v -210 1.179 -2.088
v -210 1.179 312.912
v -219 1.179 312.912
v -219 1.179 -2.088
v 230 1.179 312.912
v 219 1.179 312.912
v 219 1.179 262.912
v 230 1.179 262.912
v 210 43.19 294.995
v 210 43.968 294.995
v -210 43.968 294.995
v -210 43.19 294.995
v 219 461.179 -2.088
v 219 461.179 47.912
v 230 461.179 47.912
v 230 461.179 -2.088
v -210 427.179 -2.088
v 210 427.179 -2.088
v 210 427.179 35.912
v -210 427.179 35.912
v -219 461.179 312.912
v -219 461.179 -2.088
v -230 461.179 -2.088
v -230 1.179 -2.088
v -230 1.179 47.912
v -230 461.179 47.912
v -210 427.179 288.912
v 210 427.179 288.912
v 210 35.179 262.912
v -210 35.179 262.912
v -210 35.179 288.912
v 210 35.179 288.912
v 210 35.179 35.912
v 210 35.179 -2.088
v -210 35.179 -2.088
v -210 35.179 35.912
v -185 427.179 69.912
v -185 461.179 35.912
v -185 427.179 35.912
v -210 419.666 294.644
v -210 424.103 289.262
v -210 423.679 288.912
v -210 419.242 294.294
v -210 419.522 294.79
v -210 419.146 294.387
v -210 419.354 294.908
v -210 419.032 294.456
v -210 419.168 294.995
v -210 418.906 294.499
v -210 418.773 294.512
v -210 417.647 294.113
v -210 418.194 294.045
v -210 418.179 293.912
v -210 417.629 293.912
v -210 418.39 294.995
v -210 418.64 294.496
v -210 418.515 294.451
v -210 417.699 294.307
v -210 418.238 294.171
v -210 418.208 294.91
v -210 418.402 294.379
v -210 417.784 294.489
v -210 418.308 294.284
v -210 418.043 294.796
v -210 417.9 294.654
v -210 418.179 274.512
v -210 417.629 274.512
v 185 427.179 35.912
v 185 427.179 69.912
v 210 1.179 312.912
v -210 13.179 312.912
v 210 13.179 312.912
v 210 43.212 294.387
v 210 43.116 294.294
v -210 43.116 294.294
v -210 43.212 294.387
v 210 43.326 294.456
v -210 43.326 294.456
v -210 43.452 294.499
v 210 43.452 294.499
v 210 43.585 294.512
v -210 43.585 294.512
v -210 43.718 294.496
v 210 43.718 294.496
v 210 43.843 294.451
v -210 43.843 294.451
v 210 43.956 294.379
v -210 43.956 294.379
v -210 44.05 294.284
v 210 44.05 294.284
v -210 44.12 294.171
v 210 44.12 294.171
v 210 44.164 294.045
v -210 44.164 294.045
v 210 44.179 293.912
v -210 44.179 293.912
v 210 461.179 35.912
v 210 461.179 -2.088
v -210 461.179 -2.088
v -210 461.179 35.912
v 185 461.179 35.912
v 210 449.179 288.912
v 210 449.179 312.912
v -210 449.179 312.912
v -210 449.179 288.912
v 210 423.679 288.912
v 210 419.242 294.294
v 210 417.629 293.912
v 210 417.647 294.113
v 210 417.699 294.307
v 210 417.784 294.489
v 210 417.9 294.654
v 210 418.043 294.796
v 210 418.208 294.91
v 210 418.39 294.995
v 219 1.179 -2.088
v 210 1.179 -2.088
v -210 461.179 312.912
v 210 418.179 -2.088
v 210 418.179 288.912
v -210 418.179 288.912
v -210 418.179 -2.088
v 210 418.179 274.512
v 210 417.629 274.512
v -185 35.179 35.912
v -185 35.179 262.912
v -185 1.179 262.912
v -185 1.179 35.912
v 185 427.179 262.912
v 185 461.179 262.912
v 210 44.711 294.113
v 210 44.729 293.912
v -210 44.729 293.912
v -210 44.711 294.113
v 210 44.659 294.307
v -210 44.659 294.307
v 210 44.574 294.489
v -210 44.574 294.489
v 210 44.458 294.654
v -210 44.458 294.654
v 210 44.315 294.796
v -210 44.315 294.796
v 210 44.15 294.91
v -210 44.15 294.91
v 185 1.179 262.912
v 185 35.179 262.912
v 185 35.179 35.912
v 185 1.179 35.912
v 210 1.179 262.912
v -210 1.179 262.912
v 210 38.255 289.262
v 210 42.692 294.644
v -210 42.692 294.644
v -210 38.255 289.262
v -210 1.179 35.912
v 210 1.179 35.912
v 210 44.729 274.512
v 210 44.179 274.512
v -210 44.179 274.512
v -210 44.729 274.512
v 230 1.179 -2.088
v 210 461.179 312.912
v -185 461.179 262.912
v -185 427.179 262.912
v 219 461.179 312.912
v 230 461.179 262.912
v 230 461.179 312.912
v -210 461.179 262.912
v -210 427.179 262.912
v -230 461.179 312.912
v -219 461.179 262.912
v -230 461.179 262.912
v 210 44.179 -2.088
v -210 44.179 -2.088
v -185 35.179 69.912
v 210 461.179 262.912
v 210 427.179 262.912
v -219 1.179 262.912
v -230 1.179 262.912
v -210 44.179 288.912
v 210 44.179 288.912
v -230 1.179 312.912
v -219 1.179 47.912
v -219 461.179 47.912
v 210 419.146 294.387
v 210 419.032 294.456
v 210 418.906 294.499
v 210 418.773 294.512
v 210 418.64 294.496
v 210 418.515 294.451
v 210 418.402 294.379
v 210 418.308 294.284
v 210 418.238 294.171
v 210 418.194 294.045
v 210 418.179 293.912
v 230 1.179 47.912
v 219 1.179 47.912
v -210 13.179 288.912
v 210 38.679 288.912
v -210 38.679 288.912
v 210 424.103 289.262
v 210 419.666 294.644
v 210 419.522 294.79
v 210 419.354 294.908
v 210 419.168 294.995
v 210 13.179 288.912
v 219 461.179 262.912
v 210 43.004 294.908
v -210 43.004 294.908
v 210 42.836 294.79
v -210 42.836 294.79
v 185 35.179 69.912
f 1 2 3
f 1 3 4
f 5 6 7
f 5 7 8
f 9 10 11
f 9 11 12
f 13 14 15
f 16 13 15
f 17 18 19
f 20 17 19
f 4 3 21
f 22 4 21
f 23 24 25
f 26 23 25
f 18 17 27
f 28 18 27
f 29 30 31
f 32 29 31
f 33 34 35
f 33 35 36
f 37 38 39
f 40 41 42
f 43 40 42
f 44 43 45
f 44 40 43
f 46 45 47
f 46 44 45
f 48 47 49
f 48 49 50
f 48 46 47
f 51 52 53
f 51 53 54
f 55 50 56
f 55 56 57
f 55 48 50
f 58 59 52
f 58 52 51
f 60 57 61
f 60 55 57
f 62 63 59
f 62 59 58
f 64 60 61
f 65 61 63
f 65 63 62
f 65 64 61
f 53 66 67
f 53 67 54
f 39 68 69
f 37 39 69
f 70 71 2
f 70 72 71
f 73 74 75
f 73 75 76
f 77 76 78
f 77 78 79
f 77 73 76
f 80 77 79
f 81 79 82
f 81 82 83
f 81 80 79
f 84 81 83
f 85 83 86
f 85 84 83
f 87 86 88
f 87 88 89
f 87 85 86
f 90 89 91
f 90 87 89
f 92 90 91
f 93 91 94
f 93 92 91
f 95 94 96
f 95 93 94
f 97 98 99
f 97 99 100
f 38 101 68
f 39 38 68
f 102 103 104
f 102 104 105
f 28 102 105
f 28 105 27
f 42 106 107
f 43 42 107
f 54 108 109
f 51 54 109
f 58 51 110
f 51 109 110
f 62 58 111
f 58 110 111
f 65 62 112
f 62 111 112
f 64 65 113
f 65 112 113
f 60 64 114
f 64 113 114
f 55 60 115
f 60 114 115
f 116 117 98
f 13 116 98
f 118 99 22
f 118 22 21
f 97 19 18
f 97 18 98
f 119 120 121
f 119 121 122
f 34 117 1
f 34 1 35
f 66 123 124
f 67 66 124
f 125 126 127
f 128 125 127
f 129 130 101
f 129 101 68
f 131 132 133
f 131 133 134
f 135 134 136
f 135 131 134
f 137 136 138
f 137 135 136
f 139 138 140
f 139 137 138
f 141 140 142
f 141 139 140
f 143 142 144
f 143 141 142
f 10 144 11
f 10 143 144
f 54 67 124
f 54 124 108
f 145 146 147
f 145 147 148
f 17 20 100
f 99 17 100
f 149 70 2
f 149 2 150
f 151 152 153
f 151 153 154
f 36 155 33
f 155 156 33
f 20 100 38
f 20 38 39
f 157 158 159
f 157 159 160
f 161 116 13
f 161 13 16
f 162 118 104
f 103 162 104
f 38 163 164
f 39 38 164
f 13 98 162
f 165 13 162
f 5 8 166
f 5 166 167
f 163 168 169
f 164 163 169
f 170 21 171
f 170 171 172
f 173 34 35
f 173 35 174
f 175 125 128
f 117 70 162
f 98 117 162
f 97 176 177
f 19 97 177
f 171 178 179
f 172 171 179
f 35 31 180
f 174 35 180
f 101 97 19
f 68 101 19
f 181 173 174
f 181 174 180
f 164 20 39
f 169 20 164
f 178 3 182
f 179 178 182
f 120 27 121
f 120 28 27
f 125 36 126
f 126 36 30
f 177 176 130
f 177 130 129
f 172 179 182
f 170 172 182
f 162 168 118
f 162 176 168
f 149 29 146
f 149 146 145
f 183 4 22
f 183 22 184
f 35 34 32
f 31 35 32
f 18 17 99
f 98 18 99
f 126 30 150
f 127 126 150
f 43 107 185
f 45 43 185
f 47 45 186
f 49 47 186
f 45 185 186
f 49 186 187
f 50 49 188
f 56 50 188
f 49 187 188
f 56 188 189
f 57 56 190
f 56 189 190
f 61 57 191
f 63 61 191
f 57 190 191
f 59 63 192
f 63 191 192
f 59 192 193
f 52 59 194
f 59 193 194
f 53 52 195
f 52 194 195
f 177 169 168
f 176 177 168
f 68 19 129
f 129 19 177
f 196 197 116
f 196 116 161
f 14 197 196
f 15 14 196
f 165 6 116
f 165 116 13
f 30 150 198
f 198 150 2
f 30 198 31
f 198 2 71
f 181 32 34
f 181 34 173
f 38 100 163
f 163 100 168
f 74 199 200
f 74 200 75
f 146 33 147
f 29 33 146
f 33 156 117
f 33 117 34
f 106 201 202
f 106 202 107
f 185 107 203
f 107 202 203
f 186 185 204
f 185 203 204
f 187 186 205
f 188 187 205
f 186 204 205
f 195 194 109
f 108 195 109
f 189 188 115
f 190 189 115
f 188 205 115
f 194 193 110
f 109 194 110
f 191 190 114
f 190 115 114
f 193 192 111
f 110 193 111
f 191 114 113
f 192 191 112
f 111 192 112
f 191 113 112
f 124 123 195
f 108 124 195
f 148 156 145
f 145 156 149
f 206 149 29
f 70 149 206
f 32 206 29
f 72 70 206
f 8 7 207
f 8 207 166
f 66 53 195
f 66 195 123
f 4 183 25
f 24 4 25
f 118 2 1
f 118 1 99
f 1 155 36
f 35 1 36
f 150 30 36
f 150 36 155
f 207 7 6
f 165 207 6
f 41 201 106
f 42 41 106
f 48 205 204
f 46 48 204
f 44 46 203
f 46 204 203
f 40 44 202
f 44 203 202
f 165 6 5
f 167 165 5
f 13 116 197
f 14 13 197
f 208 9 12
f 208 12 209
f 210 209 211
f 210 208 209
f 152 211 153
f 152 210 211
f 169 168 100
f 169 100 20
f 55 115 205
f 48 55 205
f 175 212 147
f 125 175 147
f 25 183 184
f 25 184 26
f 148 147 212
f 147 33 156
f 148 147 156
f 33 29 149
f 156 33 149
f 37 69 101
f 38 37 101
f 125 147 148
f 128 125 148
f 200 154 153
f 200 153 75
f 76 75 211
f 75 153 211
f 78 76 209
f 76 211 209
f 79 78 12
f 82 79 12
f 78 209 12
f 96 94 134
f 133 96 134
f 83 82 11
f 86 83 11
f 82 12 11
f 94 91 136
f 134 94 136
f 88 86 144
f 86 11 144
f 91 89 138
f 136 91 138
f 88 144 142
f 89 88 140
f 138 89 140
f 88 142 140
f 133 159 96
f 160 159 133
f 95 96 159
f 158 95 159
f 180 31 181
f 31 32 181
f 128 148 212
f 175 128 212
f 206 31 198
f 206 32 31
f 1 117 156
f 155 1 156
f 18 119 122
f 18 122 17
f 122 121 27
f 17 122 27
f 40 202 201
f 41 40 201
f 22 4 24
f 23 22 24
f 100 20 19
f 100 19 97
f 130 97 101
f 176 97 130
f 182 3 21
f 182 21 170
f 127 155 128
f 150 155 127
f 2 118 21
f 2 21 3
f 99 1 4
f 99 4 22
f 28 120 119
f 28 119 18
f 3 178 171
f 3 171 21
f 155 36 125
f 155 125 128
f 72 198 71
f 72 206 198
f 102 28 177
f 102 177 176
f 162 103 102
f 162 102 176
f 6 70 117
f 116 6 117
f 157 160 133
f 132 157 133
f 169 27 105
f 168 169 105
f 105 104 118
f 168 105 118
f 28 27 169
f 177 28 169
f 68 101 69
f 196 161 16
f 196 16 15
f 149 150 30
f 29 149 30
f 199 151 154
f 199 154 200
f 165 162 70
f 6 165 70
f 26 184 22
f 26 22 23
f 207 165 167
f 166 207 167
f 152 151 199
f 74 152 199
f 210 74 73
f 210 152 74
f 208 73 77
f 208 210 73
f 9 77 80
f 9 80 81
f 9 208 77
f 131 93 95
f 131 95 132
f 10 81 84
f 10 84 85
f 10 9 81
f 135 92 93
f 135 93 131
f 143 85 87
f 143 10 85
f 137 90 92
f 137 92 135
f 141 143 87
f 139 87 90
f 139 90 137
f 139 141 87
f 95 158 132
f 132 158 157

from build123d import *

# Parameters (mm, degrees)
F0_W      = 9
F0_H      = 291
F1_DEPTH  = 210
F2_W      = 34
F2_H      = 38
F3_DEPTH  = 210
F5_DEPTH  = 420
F9_DEPTH  = 9
F10_W     = 11
F10_H     = 50
F11_DEPTH = 460
F12_W     = 34
F12_H     = 227
F13_DEPTH = 25
F16_DEPTH = 370


# Not quite as in the source:
# - ends of sketch curves that miss each other by under 0.0002 mm in the source are joined


with BuildPart() as f1:
    # F0 (on Right) → F1 (new body, symmetric)
    with BuildSketch(Plane.YZ):
        with Locations((39.679, 143.4123)):
            Rectangle(F0_W, F0_H)
    extrude(amount=F1_DEPTH, both=True)


with BuildPart() as f1b:
    # F0 (on Right) → F1, piece 2 (new body, symmetric)
    with BuildSketch(Plane.YZ):
        Polygon((427.179, 288.9123), (418.179, 288.9123), (418.179, -2.0877000002), (427.1789405548, -2.0877634065), align=None)
    extrude(amount=F1_DEPTH, both=True)


with BuildPart() as f3:
    # F2 (on Right) → F3 (new body, symmetric)
    with BuildSketch(Plane.YZ):
        with Locations((18.179, 16.9123)):
            Rectangle(F2_W, F2_H)
    extrude(amount=F3_DEPTH, both=True)


with BuildPart() as f3b:
    # F2 (on Right) → F3, piece 2 (new body, symmetric)
    with BuildSketch(Plane.YZ):
        Polygon((13.179, 312.9123), (1.179, 312.9123), (1.179, 262.9123), (35.179, 262.9123), (35.179, 288.9123), (13.179, 288.9123), align=None)
    extrude(amount=F3_DEPTH, both=True)


with BuildPart() as f3c:
    # F2 (on Right) → F3, piece 3 (new body, symmetric)
    with BuildSketch(Plane.YZ):
        Polygon((461.179, 262.9123), (461.179, 312.9123), (449.179, 312.9123), (449.179, 288.9123), (427.179, 288.9123), (427.179, 262.9123), align=None)
    extrude(amount=F3_DEPTH, both=True)


with BuildPart() as f3d:
    # F2 (on Right) → F3, piece 4 (new body, symmetric)
    with BuildSketch(Plane.YZ):
        with Locations((444.179, 16.9123)):
            Rectangle(F2_W, F2_H)
    extrude(amount=F3_DEPTH, both=True)


with BuildPart() as f5:
    # F4 (on face) → F5 (new body, through all)
    with BuildSketch(Plane.YZ.offset(210)):
        with BuildLine():
            ThreePointArc((43.116056405, 294.2939847231), (43.7817730788, 294.4769973335), (44.179, 293.9123))
            Line((44.179, 293.9123), (44.179, 274.5123))
            Line((44.179, 274.5123), (44.729, 274.5123))
            Line((44.729, 274.5123), (44.729, 293.9123))
            ThreePointArc((44.729, 293.9123), (44.5195970607, 294.5739473149), (43.9676484011, 294.9946365559))
            Line((43.9676484011, 294.9946365559), (43.1903515989, 294.9946365559))
            ThreePointArc((43.1903515989, 294.9946365559), (42.9173526851, 294.8528970607), (42.6916914429, 294.6438623859))
            Line((42.6916914429, 294.6438623859), (38.2546350379, 289.2621776628))
            Line((38.2546350379, 289.2621776628), (38.679, 288.9123))
            Line((38.679, 288.9123), (43.116056405, 294.2939847231))
        make_face()
    extrude(amount=-F5_DEPTH)


with BuildPart() as f7_1:
    # F7: instance of F5
    add(f5.part.mirror(Plane(origin=(0, 231.179, 143.4122999999), x_dir=(-1, 0, 0), z_dir=(0, 1, 0))))


with BuildPart() as f9:
    # F8 (on face) → F9 (new body)
    with BuildSketch(Plane.YZ.offset(210)):
        Polygon((1.179, 312.9123), (1.179, -2.0877), (461.179, -2.0877), (461.179, 312.9123), (13.179, 312.9123), align=None)
    extrude(amount=F9_DEPTH)


with BuildPart() as f11:
    # F10 (on face) → F11 (new body, through all)
    with BuildSketch(Plane.XZ.offset(-1.179)):
        with Locations((224.5, 287.9123)):
            Rectangle(F10_W, F10_H)
    extrude(amount=-F11_DEPTH)


with BuildPart() as f11b:
    # F10 (on face) → F11, piece 2 (new body, through all)
    with BuildSketch(Plane.XZ.offset(-1.179)):
        with Locations((224.5, 22.9123)):
            Rectangle(F10_W, F10_H)
    extrude(amount=-F11_DEPTH)


with BuildPart() as f13:
    # F12 (on face) → F13 (new body)
    with BuildSketch(Plane(origin=(210, 0, 0), x_dir=(0, -1, 0), z_dir=(-1, 0, 0))):
        with Locations((-18.179, 149.4123)):
            Rectangle(F12_W, F12_H)
    extrude(amount=F13_DEPTH)


with BuildPart() as f13b:
    # F12 (on face) → F13, piece 2 (new body)
    with BuildSketch(Plane(origin=(210, 0, 0), x_dir=(0, -1, 0), z_dir=(-1, 0, 0))):
        with Locations((-444.179, 149.4123)):
            Rectangle(F12_W, F12_H)
    extrude(amount=F13_DEPTH)


with BuildPart() as f14_1:
    # F14: instance of F9
    add(f9.part.mirror(Plane.YZ))


with BuildPart() as f14_2:
    # F14: instance of F11b
    add(f11b.part.mirror(Plane.YZ))


with BuildPart() as f14_3:
    # F14: instance of F11
    add(f11.part.mirror(Plane.YZ))


with BuildPart() as f14_4:
    # F14: instance of F13
    add(f13.part.mirror(Plane.YZ))


with BuildPart() as f14_5:
    # F14: instance of F13b
    add(f13b.part.mirror(Plane.YZ))


with BuildPart() as f16:
    # F15 (on face) → F16 (new body, through all)
    with BuildSketch(Plane(origin=(185, 0, 0), x_dir=(0, -1, 0), z_dir=(-1, 0, 0))):
        Polygon((-35.179, 69.9123), (-35.179, 35.9123), (-1.179, 35.9123), align=None)
    extrude(amount=F16_DEPTH)


with BuildPart() as f16b:
    # F15 (on face) → F16, piece 2 (new body, through all)
    with BuildSketch(Plane(origin=(185, 0, 0), x_dir=(0, -1, 0), z_dir=(-1, 0, 0))):
        Polygon((-427.179, 35.9123), (-427.179, 69.9123), (-461.179, 35.9123), align=None)
    extrude(amount=F16_DEPTH)


solid = Compound([f1.part, f1b.part, f3.part, f3b.part, f3c.part, f3d.part, f5.part, f7_1.part, f9.part, f11.part, f11b.part, f13.part, f13b.part, f14_1.part, f14_2.part, f14_3.part, f14_4.part, f14_5.part, f16.part, f16b.part])
